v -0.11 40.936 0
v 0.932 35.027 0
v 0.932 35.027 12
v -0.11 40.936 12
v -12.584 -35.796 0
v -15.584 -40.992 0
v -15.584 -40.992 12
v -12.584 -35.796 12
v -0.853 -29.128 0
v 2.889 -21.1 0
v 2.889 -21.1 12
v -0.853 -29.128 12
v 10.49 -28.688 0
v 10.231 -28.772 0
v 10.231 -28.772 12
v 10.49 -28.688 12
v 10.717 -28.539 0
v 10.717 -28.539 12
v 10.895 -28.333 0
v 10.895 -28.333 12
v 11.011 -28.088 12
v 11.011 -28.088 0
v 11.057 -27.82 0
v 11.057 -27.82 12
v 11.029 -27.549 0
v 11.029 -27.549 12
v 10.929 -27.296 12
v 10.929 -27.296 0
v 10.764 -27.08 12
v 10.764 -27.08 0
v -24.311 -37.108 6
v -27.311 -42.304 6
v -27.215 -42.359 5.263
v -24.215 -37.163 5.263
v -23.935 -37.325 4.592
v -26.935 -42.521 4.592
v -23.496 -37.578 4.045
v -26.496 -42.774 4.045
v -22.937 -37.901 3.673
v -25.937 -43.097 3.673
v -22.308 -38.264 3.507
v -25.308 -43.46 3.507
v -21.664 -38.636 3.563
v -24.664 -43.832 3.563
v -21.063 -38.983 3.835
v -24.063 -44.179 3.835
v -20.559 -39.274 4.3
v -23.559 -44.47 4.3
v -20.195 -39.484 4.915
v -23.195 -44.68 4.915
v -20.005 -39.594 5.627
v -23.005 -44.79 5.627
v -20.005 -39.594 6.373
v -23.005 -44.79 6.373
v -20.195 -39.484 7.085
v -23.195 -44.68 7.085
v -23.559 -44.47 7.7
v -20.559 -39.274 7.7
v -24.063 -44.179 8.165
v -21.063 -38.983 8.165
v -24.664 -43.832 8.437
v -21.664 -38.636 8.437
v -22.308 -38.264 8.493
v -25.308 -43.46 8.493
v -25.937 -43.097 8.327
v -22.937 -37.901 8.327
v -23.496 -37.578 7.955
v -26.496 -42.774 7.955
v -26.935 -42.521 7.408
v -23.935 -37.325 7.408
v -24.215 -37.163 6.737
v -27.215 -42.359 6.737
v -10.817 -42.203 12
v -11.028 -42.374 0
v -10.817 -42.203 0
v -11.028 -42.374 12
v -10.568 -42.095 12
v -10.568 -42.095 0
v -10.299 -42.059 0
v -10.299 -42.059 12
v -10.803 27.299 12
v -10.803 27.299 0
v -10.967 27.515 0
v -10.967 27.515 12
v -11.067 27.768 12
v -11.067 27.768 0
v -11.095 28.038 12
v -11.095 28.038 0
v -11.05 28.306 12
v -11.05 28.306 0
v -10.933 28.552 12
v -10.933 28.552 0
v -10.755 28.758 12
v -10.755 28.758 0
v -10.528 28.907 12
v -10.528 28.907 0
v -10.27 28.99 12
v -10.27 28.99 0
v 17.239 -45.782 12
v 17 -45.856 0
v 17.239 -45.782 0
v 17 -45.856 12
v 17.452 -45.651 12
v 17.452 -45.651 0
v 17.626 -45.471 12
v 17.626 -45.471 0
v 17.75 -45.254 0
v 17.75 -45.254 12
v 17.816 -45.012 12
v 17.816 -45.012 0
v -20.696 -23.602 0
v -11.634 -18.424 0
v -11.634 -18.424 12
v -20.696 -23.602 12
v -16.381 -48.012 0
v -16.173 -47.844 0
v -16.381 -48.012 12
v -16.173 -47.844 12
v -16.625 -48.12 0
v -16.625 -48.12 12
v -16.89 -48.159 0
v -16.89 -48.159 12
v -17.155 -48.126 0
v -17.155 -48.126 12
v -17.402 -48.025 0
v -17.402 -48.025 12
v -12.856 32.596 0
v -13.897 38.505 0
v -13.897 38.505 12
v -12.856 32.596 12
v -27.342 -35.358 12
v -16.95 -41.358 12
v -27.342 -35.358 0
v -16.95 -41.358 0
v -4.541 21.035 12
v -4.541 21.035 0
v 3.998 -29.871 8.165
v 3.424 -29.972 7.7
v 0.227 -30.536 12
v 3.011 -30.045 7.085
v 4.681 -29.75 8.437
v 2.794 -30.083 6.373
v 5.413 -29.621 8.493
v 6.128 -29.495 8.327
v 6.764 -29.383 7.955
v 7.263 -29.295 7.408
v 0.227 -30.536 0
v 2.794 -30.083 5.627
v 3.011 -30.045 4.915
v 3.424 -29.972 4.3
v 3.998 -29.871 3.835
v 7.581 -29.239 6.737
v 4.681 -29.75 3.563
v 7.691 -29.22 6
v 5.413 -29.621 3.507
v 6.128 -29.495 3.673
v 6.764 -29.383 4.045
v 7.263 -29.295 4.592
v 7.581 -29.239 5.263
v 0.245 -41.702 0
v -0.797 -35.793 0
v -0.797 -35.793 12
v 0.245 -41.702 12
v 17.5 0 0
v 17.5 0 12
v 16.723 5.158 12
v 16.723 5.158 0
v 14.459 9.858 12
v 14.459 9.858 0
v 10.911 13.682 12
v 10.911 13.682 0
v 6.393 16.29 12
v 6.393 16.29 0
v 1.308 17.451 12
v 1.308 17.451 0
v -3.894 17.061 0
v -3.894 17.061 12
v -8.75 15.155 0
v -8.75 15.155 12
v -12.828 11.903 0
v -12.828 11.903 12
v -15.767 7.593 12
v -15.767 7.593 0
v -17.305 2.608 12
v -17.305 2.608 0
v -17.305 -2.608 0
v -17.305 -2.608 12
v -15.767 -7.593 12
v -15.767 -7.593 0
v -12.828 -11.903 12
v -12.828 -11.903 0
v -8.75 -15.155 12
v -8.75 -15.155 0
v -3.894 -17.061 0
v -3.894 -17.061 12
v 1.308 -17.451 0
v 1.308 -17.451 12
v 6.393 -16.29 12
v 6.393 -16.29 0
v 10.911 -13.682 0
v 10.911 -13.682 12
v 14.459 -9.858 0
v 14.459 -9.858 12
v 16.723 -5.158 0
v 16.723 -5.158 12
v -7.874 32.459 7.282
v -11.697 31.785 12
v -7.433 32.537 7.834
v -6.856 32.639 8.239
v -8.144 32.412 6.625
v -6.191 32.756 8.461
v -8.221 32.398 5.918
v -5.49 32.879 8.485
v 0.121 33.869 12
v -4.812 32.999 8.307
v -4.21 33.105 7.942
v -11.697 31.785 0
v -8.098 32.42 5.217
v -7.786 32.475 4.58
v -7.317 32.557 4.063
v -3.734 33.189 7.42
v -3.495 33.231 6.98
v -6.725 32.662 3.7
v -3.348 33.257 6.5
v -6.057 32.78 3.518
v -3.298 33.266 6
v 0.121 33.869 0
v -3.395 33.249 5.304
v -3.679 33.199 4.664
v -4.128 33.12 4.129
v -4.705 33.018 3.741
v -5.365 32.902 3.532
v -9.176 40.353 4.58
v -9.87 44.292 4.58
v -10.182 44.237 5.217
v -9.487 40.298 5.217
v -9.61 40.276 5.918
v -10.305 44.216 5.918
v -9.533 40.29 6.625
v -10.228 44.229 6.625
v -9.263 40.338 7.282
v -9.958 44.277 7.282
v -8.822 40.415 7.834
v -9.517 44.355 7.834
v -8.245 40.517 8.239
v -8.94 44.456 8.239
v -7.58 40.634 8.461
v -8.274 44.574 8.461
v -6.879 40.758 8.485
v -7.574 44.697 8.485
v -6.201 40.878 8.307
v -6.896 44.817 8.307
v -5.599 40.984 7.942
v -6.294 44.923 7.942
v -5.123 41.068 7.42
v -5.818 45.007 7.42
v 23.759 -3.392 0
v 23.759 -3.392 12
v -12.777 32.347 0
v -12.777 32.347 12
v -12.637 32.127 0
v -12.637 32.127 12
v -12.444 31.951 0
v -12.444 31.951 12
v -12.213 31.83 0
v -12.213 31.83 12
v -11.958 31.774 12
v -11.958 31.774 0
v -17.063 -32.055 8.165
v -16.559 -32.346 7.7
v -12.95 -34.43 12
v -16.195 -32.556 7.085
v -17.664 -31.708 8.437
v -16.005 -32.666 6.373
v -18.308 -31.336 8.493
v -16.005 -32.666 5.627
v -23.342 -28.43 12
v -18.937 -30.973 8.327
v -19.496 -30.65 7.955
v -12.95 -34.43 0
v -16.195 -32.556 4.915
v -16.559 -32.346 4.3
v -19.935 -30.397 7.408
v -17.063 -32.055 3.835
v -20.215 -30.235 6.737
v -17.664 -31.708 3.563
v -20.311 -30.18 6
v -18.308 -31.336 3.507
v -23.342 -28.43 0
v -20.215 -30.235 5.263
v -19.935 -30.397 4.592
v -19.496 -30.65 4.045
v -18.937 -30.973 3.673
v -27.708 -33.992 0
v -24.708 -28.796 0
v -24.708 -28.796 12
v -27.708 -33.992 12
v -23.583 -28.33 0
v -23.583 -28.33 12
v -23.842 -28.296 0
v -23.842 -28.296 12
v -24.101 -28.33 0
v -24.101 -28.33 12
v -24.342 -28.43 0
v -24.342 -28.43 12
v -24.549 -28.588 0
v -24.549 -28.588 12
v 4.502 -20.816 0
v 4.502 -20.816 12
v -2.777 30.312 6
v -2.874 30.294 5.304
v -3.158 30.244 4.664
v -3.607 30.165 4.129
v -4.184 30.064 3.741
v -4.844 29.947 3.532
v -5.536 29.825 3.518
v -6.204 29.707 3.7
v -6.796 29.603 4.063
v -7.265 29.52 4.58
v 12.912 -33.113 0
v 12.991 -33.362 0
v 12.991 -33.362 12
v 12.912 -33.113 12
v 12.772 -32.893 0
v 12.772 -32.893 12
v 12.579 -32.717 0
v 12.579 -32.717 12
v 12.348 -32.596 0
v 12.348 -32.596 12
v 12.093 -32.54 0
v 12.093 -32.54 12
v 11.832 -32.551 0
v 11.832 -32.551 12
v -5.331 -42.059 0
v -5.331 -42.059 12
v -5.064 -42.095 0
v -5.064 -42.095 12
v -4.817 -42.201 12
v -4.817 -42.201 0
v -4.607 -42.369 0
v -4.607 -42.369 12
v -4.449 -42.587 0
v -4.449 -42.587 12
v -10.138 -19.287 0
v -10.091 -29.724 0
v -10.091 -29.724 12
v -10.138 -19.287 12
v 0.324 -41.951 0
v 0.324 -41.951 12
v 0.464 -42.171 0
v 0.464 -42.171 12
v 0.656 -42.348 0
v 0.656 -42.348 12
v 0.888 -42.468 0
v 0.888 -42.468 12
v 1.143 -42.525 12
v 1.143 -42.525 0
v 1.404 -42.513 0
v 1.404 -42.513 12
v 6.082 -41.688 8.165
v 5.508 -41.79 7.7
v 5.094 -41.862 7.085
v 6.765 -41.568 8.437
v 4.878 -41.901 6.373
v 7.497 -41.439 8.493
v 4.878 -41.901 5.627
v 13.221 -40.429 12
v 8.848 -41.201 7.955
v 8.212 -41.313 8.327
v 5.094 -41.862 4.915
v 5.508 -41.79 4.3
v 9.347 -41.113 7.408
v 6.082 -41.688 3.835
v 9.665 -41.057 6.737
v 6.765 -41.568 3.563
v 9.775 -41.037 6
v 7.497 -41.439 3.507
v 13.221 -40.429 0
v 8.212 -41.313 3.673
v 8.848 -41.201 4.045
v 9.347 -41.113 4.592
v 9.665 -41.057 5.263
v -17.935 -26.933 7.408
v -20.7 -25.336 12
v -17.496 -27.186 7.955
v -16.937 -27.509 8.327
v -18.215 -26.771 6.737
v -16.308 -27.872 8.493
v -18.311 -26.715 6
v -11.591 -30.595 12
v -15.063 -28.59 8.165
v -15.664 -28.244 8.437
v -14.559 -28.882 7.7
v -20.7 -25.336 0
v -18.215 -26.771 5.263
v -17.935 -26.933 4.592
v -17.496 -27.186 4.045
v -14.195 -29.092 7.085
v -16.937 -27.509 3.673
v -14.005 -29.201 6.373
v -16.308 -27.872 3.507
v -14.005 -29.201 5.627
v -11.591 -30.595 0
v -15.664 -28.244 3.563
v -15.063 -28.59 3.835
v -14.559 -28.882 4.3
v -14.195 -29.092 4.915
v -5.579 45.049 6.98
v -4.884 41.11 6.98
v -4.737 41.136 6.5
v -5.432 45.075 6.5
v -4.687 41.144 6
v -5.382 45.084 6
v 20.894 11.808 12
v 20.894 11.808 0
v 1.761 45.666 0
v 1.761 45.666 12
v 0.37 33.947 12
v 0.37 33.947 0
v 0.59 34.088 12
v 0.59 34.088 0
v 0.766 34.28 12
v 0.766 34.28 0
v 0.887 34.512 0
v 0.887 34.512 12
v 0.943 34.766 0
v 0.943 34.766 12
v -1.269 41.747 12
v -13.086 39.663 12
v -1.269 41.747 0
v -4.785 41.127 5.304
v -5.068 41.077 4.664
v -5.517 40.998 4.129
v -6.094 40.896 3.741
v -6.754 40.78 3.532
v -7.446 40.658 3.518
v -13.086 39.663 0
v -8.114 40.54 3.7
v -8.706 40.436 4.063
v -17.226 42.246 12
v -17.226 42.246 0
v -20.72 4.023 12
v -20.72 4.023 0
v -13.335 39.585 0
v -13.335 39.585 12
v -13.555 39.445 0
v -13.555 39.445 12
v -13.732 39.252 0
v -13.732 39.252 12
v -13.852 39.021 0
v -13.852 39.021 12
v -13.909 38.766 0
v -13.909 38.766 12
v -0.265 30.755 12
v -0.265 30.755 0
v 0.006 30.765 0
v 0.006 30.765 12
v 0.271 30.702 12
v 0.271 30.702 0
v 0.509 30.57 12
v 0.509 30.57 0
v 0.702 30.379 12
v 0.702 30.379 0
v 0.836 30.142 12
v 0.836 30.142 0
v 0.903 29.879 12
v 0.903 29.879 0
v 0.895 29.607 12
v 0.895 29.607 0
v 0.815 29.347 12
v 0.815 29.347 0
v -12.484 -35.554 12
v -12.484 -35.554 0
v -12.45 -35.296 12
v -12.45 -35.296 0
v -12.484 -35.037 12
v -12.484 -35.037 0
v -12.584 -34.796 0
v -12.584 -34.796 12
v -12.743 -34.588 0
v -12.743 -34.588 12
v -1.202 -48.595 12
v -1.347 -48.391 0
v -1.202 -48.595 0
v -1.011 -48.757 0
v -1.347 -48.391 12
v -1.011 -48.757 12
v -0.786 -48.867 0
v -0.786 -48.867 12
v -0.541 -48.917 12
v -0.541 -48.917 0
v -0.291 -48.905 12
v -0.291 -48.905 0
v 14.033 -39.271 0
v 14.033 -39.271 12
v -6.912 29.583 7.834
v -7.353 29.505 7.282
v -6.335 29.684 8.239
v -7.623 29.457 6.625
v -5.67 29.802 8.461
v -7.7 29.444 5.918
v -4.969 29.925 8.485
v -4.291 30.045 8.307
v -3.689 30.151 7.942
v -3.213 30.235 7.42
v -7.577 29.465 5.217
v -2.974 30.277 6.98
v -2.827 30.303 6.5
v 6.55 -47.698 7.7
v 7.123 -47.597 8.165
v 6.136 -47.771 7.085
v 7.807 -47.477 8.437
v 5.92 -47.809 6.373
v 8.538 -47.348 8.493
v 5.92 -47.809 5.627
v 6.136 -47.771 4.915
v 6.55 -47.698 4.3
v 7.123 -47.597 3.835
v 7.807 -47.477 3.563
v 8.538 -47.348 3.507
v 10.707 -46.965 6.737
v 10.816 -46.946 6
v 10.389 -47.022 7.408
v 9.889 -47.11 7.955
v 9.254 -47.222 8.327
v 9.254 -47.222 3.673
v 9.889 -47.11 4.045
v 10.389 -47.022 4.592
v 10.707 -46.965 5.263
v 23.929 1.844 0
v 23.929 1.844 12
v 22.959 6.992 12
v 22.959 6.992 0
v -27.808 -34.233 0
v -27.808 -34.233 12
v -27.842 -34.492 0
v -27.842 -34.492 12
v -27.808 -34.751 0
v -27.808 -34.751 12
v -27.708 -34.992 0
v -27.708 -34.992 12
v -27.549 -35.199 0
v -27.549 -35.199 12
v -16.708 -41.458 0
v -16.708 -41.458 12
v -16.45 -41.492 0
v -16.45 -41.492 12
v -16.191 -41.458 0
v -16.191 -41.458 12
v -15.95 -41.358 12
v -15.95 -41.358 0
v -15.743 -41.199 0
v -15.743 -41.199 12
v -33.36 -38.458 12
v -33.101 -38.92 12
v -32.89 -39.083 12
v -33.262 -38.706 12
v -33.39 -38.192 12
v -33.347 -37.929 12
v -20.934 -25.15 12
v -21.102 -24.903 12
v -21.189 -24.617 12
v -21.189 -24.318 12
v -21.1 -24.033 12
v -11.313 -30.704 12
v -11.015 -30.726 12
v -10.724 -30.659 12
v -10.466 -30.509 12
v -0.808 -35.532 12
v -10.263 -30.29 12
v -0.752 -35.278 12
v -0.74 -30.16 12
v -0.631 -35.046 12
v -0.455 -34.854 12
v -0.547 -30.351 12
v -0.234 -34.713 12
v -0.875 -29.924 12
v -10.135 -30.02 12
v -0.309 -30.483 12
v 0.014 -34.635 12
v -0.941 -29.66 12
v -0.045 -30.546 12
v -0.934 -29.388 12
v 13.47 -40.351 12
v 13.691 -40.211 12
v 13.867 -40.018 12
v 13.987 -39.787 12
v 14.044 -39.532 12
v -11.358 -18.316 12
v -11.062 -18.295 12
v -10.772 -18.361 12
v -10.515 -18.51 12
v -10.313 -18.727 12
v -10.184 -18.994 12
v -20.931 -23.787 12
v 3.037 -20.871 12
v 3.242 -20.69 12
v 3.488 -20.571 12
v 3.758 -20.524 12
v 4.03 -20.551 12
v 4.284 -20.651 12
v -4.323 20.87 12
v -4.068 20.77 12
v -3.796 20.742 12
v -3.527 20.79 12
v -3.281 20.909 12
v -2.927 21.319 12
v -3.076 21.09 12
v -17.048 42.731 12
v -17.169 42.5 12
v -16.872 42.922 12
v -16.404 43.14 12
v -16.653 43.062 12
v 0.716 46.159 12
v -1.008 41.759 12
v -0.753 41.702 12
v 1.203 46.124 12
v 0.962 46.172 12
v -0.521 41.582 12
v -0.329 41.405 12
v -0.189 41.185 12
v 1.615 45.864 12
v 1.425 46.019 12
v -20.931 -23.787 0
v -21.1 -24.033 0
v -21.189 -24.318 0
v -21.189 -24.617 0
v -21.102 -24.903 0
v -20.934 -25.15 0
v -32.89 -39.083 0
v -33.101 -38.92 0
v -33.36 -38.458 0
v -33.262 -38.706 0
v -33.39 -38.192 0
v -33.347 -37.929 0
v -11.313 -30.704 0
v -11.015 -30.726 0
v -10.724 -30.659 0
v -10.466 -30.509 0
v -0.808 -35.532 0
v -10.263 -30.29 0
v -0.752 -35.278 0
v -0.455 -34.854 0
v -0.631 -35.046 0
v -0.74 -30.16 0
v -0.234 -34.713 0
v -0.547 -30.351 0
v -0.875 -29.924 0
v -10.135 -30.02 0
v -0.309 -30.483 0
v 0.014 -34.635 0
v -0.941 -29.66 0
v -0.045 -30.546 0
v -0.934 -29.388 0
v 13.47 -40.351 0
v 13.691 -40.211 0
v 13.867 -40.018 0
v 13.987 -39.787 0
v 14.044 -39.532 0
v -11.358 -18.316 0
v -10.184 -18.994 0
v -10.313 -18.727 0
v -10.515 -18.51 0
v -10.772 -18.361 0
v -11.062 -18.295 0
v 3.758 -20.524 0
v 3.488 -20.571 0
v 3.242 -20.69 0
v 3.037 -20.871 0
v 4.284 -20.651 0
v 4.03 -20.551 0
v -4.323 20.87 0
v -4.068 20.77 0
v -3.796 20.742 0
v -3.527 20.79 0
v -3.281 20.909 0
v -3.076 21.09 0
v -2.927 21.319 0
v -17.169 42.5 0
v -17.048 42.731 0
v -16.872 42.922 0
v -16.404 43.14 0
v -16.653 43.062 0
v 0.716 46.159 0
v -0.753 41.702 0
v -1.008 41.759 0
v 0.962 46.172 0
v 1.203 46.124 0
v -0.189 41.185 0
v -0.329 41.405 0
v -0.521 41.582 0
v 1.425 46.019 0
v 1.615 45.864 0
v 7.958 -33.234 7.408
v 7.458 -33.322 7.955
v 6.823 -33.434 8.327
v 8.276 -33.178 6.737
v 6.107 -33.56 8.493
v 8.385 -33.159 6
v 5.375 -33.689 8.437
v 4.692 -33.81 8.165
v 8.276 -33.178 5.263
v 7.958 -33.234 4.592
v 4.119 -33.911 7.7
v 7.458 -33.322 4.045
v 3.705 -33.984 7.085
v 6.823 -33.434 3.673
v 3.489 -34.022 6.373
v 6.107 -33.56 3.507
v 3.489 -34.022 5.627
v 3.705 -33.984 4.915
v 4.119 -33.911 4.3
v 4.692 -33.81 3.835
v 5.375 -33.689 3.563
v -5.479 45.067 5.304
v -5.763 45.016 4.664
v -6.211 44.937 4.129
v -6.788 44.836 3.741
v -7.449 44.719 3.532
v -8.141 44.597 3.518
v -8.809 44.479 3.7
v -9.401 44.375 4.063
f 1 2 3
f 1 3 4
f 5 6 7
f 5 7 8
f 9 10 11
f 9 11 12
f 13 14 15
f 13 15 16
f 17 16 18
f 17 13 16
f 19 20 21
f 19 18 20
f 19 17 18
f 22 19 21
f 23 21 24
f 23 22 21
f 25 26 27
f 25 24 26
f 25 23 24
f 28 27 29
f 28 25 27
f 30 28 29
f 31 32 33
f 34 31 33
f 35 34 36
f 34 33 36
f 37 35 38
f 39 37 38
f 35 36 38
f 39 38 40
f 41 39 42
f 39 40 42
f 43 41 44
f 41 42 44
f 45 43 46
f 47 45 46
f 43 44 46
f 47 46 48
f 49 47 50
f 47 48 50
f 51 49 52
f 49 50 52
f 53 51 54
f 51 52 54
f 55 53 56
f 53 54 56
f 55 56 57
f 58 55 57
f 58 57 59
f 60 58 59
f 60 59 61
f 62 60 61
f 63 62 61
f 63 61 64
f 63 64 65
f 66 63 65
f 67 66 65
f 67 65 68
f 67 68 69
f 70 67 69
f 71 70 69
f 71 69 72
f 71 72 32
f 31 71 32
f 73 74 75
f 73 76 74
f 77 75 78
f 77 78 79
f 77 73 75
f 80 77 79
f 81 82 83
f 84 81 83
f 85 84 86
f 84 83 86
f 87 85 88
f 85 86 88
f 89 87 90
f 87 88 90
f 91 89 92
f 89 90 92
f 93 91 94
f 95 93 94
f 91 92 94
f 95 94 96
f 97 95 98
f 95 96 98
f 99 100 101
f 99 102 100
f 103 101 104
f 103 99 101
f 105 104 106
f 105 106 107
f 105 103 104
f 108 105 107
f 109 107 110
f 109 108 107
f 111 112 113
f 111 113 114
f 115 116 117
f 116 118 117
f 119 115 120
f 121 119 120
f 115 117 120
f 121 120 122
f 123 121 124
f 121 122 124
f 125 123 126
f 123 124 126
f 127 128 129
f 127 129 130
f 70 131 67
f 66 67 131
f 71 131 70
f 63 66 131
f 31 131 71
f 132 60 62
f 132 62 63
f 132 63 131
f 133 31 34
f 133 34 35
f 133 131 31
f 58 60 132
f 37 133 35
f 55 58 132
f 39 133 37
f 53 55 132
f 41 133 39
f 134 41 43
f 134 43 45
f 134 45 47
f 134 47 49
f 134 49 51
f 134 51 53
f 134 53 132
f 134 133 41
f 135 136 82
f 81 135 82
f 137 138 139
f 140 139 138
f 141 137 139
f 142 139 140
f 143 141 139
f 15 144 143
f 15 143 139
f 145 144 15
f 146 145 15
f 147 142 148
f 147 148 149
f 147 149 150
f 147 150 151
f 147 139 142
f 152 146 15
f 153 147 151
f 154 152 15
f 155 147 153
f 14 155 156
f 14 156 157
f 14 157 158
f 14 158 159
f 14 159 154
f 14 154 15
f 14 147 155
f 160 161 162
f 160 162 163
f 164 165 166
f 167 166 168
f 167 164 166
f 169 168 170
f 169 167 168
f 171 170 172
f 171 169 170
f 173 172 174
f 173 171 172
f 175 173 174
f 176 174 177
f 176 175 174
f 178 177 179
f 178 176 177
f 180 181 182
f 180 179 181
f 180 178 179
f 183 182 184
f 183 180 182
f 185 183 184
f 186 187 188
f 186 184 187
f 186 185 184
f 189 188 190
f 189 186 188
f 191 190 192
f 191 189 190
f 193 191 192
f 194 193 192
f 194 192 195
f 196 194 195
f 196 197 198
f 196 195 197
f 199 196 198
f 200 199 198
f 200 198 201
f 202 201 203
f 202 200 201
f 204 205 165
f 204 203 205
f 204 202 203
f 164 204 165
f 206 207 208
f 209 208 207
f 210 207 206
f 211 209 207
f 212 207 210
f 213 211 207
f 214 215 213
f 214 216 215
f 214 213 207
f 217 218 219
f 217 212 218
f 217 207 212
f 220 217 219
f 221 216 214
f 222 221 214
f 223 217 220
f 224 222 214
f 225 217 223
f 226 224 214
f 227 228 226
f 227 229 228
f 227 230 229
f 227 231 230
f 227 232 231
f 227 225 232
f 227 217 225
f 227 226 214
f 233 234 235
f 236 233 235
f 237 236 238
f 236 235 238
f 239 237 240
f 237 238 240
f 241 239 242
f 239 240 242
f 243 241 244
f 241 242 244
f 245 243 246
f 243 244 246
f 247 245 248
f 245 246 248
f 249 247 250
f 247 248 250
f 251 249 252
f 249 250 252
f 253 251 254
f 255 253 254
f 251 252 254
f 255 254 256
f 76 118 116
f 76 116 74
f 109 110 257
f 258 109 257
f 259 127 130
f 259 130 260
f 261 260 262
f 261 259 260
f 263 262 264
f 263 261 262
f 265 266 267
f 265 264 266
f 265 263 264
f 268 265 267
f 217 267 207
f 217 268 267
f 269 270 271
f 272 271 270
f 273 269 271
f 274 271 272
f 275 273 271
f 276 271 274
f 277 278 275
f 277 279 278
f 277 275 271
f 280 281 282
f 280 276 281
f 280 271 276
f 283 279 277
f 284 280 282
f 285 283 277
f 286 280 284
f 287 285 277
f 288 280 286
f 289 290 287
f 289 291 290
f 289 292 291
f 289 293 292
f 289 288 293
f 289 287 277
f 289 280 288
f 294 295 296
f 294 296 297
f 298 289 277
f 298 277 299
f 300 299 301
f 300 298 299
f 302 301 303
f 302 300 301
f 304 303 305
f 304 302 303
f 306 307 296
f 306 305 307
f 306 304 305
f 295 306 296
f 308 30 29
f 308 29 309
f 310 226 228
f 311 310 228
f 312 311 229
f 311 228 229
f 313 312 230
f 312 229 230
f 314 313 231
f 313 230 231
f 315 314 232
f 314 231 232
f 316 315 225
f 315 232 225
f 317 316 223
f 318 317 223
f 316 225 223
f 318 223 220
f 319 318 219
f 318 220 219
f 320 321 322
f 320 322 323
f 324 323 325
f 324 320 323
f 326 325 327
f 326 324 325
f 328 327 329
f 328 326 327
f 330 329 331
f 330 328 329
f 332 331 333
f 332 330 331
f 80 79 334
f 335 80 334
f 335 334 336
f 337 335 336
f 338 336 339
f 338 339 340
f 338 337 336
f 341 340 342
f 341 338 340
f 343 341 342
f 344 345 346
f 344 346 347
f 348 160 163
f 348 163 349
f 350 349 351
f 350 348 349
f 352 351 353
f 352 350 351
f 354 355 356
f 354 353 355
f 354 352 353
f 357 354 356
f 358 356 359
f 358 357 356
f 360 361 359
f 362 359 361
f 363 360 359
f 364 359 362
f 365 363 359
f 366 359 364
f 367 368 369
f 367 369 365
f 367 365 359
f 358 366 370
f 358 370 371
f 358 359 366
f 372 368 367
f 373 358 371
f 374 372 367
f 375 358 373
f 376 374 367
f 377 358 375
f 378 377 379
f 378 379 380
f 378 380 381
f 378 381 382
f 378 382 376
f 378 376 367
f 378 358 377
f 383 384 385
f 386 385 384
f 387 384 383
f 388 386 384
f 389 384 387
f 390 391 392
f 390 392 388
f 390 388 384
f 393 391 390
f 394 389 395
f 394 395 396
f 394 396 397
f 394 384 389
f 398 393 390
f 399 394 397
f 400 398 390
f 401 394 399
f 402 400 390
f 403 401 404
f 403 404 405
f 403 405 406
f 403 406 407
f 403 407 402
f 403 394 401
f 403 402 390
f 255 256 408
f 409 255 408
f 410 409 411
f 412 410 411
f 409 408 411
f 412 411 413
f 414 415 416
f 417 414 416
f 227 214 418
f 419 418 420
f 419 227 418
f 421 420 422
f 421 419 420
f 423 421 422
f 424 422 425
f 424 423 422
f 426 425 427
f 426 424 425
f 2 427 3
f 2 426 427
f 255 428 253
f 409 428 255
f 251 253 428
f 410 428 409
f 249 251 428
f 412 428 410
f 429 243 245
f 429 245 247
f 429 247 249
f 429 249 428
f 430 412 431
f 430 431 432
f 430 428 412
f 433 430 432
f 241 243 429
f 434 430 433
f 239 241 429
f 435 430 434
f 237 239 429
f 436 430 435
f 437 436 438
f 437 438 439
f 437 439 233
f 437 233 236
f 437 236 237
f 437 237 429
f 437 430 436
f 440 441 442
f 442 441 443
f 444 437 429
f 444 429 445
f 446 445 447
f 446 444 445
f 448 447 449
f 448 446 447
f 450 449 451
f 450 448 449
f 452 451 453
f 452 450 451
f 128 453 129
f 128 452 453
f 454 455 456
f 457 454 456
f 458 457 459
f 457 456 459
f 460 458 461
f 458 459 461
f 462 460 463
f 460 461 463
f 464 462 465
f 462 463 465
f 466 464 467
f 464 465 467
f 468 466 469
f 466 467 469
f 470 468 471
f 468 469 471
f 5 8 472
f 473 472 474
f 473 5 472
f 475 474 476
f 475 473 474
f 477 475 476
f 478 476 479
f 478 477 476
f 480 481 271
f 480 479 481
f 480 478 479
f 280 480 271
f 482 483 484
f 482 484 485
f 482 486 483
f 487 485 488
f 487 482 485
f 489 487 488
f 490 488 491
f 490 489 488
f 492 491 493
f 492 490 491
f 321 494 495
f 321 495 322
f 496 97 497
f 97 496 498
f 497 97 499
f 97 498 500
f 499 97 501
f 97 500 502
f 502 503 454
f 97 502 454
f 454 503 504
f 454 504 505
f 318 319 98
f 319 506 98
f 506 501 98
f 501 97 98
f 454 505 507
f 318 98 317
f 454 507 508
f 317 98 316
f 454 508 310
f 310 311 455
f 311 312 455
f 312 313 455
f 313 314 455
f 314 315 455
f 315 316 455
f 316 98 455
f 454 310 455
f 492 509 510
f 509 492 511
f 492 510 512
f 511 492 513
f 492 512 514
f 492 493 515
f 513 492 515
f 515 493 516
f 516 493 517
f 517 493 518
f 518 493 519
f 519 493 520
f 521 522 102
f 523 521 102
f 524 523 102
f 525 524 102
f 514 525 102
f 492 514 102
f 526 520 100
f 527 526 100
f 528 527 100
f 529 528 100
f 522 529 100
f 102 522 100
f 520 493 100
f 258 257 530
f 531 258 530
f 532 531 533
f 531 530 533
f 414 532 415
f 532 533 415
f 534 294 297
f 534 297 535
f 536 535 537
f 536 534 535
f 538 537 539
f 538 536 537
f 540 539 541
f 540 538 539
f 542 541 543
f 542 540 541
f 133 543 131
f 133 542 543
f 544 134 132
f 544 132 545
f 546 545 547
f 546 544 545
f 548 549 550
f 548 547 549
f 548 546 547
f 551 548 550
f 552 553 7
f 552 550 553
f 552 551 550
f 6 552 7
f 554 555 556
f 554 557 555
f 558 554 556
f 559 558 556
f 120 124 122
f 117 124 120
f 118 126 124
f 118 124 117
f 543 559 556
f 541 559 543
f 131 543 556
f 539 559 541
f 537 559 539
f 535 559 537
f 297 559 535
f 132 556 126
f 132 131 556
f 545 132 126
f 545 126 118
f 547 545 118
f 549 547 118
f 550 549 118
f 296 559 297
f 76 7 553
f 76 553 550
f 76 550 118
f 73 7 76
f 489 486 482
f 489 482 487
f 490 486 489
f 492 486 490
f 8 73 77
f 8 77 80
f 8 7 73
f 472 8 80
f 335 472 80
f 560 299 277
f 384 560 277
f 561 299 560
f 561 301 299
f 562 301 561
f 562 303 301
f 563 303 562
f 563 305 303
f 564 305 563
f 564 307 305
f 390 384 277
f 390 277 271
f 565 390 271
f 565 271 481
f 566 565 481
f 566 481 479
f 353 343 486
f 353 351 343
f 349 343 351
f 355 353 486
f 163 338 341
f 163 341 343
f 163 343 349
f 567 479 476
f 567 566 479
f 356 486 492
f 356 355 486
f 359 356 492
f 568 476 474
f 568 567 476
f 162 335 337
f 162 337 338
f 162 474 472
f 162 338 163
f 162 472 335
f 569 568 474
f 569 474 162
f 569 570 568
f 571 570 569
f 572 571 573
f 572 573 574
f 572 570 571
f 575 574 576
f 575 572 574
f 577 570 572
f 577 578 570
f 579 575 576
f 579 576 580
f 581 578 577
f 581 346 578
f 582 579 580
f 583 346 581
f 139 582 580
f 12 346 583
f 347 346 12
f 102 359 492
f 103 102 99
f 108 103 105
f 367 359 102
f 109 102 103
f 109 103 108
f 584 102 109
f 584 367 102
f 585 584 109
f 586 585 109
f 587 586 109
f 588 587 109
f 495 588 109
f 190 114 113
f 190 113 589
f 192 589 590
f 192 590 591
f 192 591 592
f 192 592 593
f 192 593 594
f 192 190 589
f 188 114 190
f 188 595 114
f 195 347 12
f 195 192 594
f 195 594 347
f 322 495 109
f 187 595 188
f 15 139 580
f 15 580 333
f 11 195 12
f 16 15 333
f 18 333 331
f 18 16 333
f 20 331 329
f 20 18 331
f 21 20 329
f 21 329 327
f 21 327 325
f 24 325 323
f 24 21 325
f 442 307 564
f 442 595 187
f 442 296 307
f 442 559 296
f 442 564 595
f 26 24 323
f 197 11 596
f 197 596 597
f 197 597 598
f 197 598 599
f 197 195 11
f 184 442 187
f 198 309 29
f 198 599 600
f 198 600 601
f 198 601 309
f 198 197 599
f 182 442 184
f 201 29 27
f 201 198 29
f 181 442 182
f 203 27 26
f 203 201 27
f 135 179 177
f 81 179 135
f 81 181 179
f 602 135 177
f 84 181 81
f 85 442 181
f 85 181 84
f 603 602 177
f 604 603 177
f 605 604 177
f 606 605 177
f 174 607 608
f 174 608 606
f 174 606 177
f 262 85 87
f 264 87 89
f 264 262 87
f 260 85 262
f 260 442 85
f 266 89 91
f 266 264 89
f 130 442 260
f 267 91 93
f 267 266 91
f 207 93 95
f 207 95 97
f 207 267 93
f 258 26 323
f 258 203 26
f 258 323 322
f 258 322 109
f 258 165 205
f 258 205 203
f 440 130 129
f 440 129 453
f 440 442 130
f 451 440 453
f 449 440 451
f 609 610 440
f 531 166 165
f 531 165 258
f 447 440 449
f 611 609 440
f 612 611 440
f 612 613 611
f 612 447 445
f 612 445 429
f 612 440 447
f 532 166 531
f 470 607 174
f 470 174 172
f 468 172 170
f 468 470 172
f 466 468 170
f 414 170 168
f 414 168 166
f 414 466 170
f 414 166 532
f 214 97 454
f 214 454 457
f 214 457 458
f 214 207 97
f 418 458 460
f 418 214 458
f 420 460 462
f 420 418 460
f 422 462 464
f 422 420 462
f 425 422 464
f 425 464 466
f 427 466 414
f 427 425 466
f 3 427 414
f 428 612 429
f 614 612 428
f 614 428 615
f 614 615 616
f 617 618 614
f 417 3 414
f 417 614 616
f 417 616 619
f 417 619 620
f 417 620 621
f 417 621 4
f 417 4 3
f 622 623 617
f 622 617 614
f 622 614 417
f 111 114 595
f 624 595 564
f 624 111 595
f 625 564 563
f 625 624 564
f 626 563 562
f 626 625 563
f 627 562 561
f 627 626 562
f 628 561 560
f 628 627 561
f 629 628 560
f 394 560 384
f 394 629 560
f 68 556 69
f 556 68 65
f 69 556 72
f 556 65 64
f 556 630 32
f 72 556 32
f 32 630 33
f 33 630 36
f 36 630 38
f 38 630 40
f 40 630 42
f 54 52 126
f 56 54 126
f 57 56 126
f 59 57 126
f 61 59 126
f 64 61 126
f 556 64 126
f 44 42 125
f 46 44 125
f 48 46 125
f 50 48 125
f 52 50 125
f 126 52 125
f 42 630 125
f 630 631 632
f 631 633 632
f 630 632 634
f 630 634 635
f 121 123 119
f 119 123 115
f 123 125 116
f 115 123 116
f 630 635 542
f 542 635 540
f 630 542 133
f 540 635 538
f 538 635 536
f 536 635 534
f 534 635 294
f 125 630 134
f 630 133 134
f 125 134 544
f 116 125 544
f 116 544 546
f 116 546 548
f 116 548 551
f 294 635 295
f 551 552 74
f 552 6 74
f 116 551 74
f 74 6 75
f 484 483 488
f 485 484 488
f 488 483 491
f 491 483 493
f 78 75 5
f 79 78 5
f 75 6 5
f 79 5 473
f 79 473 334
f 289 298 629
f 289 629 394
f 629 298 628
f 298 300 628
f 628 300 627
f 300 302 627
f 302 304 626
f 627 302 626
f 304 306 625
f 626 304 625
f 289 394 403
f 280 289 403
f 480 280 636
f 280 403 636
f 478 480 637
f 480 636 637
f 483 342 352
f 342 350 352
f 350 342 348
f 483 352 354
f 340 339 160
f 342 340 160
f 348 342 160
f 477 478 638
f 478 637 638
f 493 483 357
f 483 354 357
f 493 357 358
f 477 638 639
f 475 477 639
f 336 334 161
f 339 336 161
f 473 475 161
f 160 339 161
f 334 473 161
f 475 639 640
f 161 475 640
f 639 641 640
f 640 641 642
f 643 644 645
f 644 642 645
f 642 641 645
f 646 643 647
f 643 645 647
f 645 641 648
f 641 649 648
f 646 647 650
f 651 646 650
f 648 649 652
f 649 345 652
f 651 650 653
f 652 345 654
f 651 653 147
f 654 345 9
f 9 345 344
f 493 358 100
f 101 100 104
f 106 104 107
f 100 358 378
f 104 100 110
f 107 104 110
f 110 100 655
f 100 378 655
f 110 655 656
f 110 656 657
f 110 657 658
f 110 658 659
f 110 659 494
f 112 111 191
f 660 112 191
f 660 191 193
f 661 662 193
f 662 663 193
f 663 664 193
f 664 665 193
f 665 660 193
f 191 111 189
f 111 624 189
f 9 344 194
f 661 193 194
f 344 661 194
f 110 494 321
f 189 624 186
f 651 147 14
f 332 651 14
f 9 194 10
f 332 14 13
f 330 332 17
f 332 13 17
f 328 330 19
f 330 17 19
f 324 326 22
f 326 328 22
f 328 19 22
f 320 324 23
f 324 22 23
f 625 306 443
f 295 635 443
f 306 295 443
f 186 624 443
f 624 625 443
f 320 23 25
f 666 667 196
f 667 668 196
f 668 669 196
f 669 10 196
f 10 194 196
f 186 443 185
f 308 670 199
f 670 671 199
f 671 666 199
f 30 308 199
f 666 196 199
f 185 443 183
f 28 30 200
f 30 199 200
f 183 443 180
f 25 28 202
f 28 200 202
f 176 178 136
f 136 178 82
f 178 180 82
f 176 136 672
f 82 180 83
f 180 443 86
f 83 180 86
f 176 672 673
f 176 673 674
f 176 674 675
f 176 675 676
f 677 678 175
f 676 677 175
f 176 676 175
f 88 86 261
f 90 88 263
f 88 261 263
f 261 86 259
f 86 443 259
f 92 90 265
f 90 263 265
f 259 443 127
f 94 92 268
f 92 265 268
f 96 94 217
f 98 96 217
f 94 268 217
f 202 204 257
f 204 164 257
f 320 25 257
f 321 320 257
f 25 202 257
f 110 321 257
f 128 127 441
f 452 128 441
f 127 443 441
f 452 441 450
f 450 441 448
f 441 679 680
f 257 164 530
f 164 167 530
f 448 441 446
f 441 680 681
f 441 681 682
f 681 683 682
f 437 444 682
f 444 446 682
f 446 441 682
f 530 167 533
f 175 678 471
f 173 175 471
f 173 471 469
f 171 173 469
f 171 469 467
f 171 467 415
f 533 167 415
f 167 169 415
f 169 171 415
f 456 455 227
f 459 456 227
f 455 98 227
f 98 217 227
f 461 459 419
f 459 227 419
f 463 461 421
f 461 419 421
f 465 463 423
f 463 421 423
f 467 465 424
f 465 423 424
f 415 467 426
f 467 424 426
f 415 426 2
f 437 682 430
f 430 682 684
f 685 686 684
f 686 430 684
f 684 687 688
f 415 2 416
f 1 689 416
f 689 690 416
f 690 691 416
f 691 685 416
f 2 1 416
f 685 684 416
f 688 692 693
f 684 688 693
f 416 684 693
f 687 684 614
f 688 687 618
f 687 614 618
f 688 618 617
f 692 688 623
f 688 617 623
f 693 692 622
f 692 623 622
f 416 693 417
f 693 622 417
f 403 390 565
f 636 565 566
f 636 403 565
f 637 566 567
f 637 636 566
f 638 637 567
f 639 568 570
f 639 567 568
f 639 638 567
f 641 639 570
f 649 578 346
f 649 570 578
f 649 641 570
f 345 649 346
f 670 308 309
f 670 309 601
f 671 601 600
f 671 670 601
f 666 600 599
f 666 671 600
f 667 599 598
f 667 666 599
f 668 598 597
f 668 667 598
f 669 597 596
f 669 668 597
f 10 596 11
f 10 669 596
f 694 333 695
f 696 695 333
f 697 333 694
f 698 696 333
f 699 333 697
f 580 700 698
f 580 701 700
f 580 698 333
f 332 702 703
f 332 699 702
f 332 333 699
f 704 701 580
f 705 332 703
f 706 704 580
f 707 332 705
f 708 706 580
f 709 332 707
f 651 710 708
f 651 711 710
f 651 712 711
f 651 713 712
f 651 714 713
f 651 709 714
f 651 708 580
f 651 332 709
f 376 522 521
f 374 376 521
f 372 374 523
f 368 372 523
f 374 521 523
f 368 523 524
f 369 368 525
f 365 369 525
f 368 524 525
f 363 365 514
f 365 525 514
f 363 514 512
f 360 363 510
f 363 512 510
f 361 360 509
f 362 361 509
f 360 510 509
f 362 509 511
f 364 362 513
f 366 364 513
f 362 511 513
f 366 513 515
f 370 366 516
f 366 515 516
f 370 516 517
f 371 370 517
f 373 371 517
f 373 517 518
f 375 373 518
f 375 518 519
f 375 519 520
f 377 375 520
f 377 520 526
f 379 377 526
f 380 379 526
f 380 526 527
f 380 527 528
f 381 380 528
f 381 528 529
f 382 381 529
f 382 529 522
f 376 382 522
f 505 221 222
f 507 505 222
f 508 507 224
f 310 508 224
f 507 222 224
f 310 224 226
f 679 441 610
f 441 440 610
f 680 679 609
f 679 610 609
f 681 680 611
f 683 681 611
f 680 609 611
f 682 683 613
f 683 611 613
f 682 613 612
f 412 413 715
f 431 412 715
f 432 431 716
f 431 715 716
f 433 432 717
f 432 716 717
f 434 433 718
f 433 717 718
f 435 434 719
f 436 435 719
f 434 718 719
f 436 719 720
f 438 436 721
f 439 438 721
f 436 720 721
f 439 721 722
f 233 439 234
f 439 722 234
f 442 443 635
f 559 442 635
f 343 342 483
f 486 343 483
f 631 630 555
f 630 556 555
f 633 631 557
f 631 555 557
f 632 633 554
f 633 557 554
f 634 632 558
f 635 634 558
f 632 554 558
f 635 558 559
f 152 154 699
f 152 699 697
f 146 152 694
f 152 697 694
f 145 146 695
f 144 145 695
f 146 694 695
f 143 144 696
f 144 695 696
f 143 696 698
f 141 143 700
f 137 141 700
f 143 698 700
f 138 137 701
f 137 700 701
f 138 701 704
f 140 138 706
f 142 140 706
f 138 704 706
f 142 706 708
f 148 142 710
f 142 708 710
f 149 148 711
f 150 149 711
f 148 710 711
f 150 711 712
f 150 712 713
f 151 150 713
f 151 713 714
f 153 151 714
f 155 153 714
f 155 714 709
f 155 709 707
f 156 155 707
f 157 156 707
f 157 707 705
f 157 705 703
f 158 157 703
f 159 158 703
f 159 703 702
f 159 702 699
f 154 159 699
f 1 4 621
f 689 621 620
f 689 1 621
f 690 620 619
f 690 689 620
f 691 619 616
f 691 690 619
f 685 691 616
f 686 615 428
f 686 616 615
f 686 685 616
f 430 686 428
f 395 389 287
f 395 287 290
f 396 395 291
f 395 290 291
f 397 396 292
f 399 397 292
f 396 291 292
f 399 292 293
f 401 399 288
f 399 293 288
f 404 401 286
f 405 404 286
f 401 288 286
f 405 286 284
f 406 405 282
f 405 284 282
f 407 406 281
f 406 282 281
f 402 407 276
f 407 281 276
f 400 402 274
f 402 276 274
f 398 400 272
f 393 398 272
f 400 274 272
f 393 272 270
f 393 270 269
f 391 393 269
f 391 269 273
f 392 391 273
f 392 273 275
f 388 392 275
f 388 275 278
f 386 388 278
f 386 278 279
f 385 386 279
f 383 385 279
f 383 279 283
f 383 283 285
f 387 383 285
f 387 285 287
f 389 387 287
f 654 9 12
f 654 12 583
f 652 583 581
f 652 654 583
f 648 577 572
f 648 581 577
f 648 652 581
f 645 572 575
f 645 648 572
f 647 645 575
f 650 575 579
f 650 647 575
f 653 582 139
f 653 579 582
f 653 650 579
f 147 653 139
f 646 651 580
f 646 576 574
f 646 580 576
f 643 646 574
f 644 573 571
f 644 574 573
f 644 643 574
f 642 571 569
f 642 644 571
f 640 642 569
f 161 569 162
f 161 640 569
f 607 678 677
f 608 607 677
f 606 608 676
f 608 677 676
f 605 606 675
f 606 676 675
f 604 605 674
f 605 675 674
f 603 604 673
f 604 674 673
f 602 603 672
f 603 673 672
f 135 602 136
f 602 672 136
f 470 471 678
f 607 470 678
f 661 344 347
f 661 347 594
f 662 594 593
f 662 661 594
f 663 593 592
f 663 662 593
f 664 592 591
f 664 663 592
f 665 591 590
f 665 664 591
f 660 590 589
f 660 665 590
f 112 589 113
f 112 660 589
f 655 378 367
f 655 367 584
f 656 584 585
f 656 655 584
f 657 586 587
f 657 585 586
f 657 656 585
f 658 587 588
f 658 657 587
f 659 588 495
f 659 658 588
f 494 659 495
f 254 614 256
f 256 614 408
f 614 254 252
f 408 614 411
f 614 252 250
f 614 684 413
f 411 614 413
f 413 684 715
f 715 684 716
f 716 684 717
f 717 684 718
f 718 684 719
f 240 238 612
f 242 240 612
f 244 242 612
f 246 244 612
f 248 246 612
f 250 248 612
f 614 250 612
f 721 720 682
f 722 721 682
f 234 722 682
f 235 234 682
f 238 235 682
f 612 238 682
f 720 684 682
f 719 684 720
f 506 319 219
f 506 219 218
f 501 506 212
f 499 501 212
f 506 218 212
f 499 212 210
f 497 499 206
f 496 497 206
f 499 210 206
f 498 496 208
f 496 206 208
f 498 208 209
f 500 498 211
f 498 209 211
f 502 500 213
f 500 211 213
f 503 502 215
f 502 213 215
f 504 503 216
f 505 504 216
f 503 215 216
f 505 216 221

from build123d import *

# Parameters (mm, degrees)
BOSS_EXTRUDE1_DEPTH = 12
SKETCH2_5_R         = 17.5
CUT_EXTRUDE1_DEPTH  = 61.62435091
CUT_EXTRUDE2_DEPTH  = 61.62435091
FILLET2_R           = 1
SKETCH5_R           = 2.5
CUT_EXTRUDE3_DEPTH  = 20
SKETCH6_R           = 2.5
CUT_EXTRUDE4_DEPTH  = 20
SKETCH7_R           = 2.5
CUT_EXTRUDE5_DEPTH  = 20


with BuildPart() as part:
    # Sketch2 → Boss-Extrude1 (new body)
    with BuildSketch(Plane.XY):
        with BuildLine():
            Line((20.894470269, 11.807671751), (1.412805817, 46.281788856))
            Line((1.412805817, 46.281788856), (-17.156907259, 43.007447417))
            Line((-17.156907259, 43.007447417), (-20.719877005, 4.022649671))
            Line((-20.719877005, 4.022649671), (-33.575613753, -38.686924938))
            Line((-33.575613753, -38.686924938), (-16.716052914, -48.420796926))
            Line((-16.716052914, -48.420796926), (-10.73162709, -42.058723264))
            Line((-10.73162709, -42.058723264), (-4.73162709, -42.058723264))
            Line((-4.73162709, -42.058723264), (-1.004945592, -49.030501572))
            Line((-1.004945592, -49.030501572), (17.713759132, -45.729888885))
            Line((17.713759132, -45.729888885), (23.759018728, -3.392495999))
            ThreePointArc((23.759018728, -3.392495999), (23.58484248, 4.444682801), (20.894470269, 11.807671751))
        make_face()
    extrude(amount=BOSS_EXTRUDE1_DEPTH)

    # Sketch2<5> → Cut-Extrude1 (cut, through all)
    with BuildSketch(Plane.XY):
        Circle(SKETCH2_5_R)
    extrude(amount=CUT_EXTRUDE1_DEPTH, mode=Mode.SUBTRACT)

    # Sketch4 → Cut-Extrude2 (cut, through all)
    with BuildSketch(Plane(origin=(0, 0, 0), x_dir=(-1, 0, 0), z_dir=(0, 0, -1))):
        with BuildLine():
            Line((16.949680911, -41.357708509), (27.341985756, -35.357708509))
            ThreePointArc((27.341985756, -35.357708509), (27.807911582, -34.750502151), (27.70801116, -33.991683106))
            Line((27.70801116, -33.991683106), (24.70801116, -28.795530683))
            ThreePointArc((24.70801116, -28.795530683), (24.100804801, -28.329604857), (23.341985756, -28.429505279))
            Line((23.341985756, -28.429505279), (12.949680911, -34.429505279))
            ThreePointArc((12.949680911, -34.429505279), (12.483755084, -35.036711638), (12.583655507, -35.795530683))
            Line((12.583655507, -35.795530683), (15.583655507, -40.991683106))
            ThreePointArc((15.583655507, -40.991683106), (16.190861866, -41.457608932), (16.949680911, -41.357708509))
        make_face()
        with BuildLine():
            Line((11.591437777, -30.594885164), (20.70022889, -25.335922163))
            ThreePointArc((20.70022889, -25.335922163), (21.200226386, -24.467658925), (20.696347848, -23.601642201))
            Line((20.696347848, -23.601642201), (11.63426972, -18.423588462))
            ThreePointArc((11.63426972, -18.423588462), (10.638150761, -18.425817617), (10.138160777, -19.287367363))
            Line((10.138160777, -19.287367363), (10.091447793, -29.724384103))
            ThreePointArc((10.091447793, -29.724384103), (10.589501007, -30.593764079), (11.591437777, -30.594885164))
        make_face()
        with BuildLine():
            Line((-13.221364222, -40.429459644), (-1.403671186, -42.513237776))
            ThreePointArc((-1.403671186, -42.513237776), (-0.656446572, -42.347582067), (-0.245215255, -41.702078201))
            Line((-0.245215255, -41.702078201), (0.796673811, -35.793231683))
            ThreePointArc((0.796673811, -35.793231683), (0.631018102, -35.046007069), (-0.014485765, -34.634775752))
            Line((-0.014485765, -34.634775752), (-11.832178801, -32.55099762))
            ThreePointArc((-11.832178801, -32.55099762), (-12.579403415, -32.716653329), (-12.990634731, -33.362157195))
            Line((-12.990634731, -33.362157195), (-14.032523797, -39.271003713))
            ThreePointArc((-14.032523797, -39.271003713), (-13.866868089, -40.018228328), (-13.221364222, -40.429459644))
        make_face()
        with BuildLine():
            ThreePointArc((-10.764474433, -27.079820723), (-11.010965186, -28.087601228), (-10.230917355, -28.771636769))
            Line((-10.230917355, -28.771636769), (-0.226561789, -30.53567458))
            ThreePointArc((-0.226561789, -30.53567458), (0.740397335, -30.159683501), (0.853453027, -29.128374794))
            Line((0.853453027, -29.128374794), (-2.888697749, -21.100387627))
            ThreePointArc((-2.888697749, -21.100387627), (-3.621416209, -20.538071906), (-4.502269642, -20.815871366))
            Line((-4.502269642, -20.815871366), (-10.764474433, -27.079820723))
        make_face()
        with BuildLine():
            Line((-0.120573929, 33.868814166), (11.697119107, 31.785036034))
            ThreePointArc((11.697119107, 31.785036034), (12.444343721, 31.950691743), (12.855575038, 32.59619561))
            Line((12.855575038, 32.59619561), (13.897464104, 38.505042128))
            ThreePointArc((13.897464104, 38.505042128), (13.731808395, 39.252266742), (13.086304528, 39.663498059))
            Line((13.086304528, 39.663498059), (1.268611492, 41.747276191))
            ThreePointArc((1.268611492, 41.747276191), (0.521386878, 41.581620482), (0.110155561, 40.936116615))
            Line((0.110155561, 40.936116615), (-0.931733505, 35.027270097))
            ThreePointArc((-0.931733505, 35.027270097), (-0.766077796, 34.280045483), (-0.120573929, 33.868814166))
        make_face()
        with BuildLine():
            ThreePointArc((0.265150273, 30.754520747), (-0.701808851, 30.378529668), (-0.814864543, 29.347220961))
            Line((-0.814864543, 29.347220961), (2.927286233, 21.319233794))
            ThreePointArc((2.927286233, 21.319233794), (3.660004693, 20.756918074), (4.540858126, 21.034717534))
            Line((4.540858126, 21.034717534), (10.803062917, 27.29866689))
            ThreePointArc((10.803062917, 27.29866689), (11.04955367, 28.306447396), (10.269505839, 28.990482936))
            Line((10.269505839, 28.990482936), (0.265150273, 30.754520747))
        make_face()
    extrude(amount=-CUT_EXTRUDE2_DEPTH, mode=Mode.SUBTRACT)

    # Fillet2
    fillet2_edges = [part.edges().sort_by_distance(p)[0] for p in [
        (17.713759132, -45.729888885, 6),
        (-1.004945592, -49.030501572, 6),
        (-10.73162709, -42.058723264, 6),
        (-4.73162709, -42.058723264, 6),
        (-16.716052914, -48.420796926, 6),
        (-33.575613753, -38.686924938, 6),
        (-17.156907259, 43.007447417, 6),
        (1.412805817, 46.281788856, 6),
    ]]
    fillet(fillet2_edges, radius=FILLET2_R)

    # Sketch5 → Cut-Extrude3 (cut)
    with BuildSketch(Plane(origin=(8.35440677, -47.380195228, 0), x_dir=(0.9848077530122075, 0.17364817766693383, 0), z_dir=(0.17364817766693386, -0.9848077530122076, 0))):
        with Locations((0, 6)):
            Circle(SKETCH5_R)
    extrude(amount=-CUT_EXTRUDE3_DEPTH, mode=Mode.SUBTRACT)

    # Sketch6 → Cut-Extrude4 (cut)
    with BuildSketch(Plane(origin=(-25.145833333, -43.553860932, 0), x_dir=(0.86602540378444, -0.4999999999999975, 0), z_dir=(-0.4999999999999975, -0.86602540378444, 0))):
        with Locations((0, 6)):
            Circle(SKETCH6_R)
    extrude(amount=-CUT_EXTRUDE4_DEPTH, mode=Mode.SUBTRACT)

    # Sketch7 → Cut-Extrude5 (cut)
    with BuildSketch(Plane(origin=(-7.872050721, 44.644618137, 0), x_dir=(0.9848077530122087, 0.17364817766692725, 0), z_dir=(-0.17364817766692725, 0.9848077530122087, 0))):
        with Locations((0.028573577, -6)):
            Circle(SKETCH7_R)
    extrude(amount=-CUT_EXTRUDE5_DEPTH, mode=Mode.SUBTRACT)


solid = part.part
